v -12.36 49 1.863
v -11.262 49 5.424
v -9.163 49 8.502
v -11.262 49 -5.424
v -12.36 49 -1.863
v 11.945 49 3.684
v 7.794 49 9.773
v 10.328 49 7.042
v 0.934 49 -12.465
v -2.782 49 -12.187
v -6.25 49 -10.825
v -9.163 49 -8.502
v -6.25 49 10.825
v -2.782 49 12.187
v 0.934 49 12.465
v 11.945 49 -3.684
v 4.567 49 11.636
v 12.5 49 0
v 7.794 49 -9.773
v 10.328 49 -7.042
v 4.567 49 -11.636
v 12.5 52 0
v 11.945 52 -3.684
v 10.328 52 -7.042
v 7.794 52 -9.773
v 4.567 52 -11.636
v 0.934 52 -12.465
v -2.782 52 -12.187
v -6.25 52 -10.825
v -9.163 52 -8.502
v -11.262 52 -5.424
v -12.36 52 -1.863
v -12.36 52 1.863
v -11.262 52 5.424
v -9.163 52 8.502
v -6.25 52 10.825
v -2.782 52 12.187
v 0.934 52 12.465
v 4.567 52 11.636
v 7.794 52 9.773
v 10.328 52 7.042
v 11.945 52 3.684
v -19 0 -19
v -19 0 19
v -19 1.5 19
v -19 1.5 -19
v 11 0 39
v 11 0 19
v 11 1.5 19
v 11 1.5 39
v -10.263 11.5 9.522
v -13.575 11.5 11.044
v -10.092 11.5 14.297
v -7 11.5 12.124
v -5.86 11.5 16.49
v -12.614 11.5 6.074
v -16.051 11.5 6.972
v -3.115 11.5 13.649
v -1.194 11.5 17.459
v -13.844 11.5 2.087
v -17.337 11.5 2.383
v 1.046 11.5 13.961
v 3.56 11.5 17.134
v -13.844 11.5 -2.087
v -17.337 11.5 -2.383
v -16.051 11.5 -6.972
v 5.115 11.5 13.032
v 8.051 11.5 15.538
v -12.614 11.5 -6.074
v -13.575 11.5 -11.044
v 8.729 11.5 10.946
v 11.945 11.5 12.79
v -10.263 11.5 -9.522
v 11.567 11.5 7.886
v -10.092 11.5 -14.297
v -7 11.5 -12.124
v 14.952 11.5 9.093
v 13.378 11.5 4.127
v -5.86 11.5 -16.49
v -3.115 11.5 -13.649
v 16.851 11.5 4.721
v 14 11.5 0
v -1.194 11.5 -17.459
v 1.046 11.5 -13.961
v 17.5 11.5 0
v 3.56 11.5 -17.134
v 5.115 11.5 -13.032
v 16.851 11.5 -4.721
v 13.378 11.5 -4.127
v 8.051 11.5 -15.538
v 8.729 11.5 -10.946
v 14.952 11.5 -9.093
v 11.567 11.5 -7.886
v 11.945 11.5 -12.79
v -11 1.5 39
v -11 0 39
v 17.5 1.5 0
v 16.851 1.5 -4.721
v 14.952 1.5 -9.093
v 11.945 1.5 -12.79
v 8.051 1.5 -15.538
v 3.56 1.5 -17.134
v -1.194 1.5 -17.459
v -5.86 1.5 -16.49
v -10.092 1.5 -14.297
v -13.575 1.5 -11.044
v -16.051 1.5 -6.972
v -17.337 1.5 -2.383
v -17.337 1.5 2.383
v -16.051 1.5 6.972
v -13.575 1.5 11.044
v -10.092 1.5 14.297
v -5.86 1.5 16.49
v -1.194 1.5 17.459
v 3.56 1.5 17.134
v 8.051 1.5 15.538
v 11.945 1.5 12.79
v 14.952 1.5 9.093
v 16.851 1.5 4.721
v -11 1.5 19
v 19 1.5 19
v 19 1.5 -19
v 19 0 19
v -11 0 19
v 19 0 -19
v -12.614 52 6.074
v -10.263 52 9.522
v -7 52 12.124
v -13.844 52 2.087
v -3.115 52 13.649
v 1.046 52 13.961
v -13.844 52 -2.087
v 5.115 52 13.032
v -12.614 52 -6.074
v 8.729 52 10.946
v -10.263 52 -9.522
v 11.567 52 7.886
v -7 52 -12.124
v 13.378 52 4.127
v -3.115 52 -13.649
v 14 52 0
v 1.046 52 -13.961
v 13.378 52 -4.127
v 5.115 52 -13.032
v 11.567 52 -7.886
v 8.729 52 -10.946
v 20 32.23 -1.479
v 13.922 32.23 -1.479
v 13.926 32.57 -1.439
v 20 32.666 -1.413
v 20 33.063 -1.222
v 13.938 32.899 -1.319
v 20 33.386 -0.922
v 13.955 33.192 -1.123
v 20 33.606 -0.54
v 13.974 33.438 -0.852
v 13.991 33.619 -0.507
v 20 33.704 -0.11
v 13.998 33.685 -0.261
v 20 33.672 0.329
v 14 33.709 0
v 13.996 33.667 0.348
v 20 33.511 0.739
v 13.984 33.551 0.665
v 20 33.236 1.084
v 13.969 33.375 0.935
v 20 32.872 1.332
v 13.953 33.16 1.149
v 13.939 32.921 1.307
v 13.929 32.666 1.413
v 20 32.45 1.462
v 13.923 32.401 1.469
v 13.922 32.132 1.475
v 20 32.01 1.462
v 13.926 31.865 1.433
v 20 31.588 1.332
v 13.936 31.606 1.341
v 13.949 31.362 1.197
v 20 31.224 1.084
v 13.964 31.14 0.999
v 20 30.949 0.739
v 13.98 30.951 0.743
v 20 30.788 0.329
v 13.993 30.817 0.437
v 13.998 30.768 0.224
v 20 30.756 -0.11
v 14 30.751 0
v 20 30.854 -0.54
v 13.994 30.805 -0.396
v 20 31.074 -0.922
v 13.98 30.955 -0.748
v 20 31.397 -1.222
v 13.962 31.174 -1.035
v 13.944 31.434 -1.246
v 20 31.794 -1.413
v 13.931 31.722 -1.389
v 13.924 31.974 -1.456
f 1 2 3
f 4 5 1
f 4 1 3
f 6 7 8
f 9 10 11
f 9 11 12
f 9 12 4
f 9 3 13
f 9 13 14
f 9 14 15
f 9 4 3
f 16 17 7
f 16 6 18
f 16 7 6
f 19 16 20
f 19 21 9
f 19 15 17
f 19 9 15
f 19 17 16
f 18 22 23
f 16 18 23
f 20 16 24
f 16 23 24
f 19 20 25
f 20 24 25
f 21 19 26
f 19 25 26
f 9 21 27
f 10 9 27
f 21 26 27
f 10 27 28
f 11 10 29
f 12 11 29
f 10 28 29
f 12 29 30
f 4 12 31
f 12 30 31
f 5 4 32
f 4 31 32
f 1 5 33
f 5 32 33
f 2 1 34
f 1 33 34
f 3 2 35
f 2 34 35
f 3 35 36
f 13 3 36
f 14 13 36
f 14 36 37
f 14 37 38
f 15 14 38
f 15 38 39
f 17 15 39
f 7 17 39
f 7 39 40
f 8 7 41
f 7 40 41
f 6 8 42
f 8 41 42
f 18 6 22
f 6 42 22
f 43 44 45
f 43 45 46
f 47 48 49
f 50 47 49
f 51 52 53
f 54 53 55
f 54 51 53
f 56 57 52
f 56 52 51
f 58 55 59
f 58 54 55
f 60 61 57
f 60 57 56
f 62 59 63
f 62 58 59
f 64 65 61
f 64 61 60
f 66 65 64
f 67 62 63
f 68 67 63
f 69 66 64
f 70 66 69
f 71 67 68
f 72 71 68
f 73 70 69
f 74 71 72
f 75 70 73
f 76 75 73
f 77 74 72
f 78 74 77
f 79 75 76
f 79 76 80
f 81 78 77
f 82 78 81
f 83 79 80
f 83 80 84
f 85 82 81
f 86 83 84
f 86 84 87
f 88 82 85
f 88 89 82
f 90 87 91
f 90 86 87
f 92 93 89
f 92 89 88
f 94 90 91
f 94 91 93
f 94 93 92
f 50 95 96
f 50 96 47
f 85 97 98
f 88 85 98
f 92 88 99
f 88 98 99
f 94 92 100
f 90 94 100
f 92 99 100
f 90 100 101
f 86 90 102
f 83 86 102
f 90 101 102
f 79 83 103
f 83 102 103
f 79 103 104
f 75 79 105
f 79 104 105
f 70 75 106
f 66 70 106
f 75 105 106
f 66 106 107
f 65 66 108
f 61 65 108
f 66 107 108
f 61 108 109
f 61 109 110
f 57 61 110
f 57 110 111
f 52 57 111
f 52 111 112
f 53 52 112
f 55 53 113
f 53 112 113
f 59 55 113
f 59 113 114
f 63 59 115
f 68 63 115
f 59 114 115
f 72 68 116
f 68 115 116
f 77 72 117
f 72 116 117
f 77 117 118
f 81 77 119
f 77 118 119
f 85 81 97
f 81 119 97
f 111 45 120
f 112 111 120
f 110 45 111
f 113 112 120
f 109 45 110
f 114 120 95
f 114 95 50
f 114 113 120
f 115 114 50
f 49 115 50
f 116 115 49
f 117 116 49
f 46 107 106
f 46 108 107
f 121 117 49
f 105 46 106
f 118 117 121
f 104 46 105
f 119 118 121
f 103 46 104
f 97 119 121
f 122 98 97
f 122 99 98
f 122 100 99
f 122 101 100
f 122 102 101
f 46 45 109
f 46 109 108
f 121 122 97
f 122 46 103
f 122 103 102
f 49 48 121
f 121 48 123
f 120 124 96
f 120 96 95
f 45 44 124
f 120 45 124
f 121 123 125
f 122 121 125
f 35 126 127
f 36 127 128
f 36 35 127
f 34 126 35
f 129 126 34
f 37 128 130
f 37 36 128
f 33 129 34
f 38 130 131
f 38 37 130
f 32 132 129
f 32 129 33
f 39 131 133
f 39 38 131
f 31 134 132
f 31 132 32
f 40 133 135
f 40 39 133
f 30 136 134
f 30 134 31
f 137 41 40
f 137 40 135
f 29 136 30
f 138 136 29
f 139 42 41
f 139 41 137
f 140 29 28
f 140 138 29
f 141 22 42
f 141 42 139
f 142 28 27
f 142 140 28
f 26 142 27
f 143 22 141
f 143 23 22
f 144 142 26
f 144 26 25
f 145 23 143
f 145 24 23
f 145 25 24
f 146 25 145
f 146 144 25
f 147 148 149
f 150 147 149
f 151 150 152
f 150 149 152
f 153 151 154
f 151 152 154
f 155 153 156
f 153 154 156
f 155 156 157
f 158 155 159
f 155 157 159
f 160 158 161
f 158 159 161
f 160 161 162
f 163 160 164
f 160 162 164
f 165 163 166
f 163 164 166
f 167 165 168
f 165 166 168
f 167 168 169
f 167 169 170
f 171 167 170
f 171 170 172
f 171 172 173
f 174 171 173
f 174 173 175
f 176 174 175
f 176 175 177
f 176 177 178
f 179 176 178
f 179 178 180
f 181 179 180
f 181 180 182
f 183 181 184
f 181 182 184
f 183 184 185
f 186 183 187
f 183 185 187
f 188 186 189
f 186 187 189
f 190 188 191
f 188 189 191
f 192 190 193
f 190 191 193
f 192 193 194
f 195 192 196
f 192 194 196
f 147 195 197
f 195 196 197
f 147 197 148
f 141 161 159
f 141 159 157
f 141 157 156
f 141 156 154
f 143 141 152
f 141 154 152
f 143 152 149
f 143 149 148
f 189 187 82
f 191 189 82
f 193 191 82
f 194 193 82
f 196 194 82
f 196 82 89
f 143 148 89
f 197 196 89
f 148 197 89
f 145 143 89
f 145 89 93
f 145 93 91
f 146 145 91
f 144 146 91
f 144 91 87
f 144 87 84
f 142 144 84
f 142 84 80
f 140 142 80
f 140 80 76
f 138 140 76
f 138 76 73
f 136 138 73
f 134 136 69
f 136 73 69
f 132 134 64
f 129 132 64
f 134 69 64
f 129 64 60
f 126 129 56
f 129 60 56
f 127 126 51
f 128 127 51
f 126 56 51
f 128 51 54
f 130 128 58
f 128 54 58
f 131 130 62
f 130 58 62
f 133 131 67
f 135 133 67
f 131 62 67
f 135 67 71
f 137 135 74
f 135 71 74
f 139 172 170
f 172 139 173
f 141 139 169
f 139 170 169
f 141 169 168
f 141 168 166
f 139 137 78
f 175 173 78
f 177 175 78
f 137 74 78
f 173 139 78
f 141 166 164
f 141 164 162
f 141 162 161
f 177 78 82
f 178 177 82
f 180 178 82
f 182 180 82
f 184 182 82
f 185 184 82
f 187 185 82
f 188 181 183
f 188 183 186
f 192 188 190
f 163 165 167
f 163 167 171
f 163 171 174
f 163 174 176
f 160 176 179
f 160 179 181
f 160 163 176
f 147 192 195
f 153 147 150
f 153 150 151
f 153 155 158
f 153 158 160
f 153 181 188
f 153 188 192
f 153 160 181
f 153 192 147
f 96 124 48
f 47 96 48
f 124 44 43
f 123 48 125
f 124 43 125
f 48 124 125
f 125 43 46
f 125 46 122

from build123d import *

# Parameters (mm, degrees)
SKETCH1_W           = 38
SKETCH1_H           = 38
BOSS_EXTRUDE1_DEPTH = 1.5
SKETCH2_R           = 17.5
BOSS_EXTRUDE2_DEPTH = 10
SKETCH3_R           = 14
BOSS_EXTRUDE3_DEPTH = 40.5
SKETCH4_R           = 12.5
CUT_EXTRUDE1_DEPTH  = 3
SKETCH5_R           = 1.478595514
BOSS_EXTRUDE4_DEPTH = 20
SKETCH6_W           = 22
SKETCH6_H           = 1.5
BOSS_EXTRUDE5_DEPTH = 20


with BuildPart() as part:
    # Sketch1 → Boss-Extrude1 (new body)
    with BuildSketch(Plane(origin=(0, 0, 0), x_dir=(1, 0, 0), z_dir=(0, 1, 0))):
        Rectangle(SKETCH1_W, SKETCH1_H)
    extrude(amount=BOSS_EXTRUDE1_DEPTH)

    # Sketch2 → Boss-Extrude2 (add)
    with BuildSketch(Plane(origin=(0, 1.5, 0), x_dir=(1, 0, 0), z_dir=(0, 1, 0))):
        Circle(SKETCH2_R)
    extrude(amount=BOSS_EXTRUDE2_DEPTH)

    # Sketch3 → Boss-Extrude3 (add)
    with BuildSketch(Plane(origin=(0, 11.5, 0), x_dir=(1, 0, 0), z_dir=(0, 1, 0))):
        Circle(SKETCH3_R)
    extrude(amount=BOSS_EXTRUDE3_DEPTH)

    # Sketch4 → Cut-Extrude1 (cut)
    with BuildSketch(Plane(origin=(0, 52, 0), x_dir=(1, 0, 0), z_dir=(0, 1, 0))):
        Circle(SKETCH4_R)
    extrude(amount=-CUT_EXTRUDE1_DEPTH, mode=Mode.SUBTRACT)

    # Sketch5 → Boss-Extrude4 (add)
    with BuildSketch(Plane(origin=(0, 0, 0), x_dir=(0, 0, -1), z_dir=(1, 0, 0))):
        with Locations((0, 32.23)):
            Circle(SKETCH5_R)
    extrude(amount=BOSS_EXTRUDE4_DEPTH)

    # Sketch6 → Boss-Extrude5 (add)
    with BuildSketch(Plane.XY.offset(19)):
        with Locations((0, 0.75)):
            Rectangle(SKETCH6_W, SKETCH6_H)
    extrude(amount=BOSS_EXTRUDE5_DEPTH)


solid = part.part
